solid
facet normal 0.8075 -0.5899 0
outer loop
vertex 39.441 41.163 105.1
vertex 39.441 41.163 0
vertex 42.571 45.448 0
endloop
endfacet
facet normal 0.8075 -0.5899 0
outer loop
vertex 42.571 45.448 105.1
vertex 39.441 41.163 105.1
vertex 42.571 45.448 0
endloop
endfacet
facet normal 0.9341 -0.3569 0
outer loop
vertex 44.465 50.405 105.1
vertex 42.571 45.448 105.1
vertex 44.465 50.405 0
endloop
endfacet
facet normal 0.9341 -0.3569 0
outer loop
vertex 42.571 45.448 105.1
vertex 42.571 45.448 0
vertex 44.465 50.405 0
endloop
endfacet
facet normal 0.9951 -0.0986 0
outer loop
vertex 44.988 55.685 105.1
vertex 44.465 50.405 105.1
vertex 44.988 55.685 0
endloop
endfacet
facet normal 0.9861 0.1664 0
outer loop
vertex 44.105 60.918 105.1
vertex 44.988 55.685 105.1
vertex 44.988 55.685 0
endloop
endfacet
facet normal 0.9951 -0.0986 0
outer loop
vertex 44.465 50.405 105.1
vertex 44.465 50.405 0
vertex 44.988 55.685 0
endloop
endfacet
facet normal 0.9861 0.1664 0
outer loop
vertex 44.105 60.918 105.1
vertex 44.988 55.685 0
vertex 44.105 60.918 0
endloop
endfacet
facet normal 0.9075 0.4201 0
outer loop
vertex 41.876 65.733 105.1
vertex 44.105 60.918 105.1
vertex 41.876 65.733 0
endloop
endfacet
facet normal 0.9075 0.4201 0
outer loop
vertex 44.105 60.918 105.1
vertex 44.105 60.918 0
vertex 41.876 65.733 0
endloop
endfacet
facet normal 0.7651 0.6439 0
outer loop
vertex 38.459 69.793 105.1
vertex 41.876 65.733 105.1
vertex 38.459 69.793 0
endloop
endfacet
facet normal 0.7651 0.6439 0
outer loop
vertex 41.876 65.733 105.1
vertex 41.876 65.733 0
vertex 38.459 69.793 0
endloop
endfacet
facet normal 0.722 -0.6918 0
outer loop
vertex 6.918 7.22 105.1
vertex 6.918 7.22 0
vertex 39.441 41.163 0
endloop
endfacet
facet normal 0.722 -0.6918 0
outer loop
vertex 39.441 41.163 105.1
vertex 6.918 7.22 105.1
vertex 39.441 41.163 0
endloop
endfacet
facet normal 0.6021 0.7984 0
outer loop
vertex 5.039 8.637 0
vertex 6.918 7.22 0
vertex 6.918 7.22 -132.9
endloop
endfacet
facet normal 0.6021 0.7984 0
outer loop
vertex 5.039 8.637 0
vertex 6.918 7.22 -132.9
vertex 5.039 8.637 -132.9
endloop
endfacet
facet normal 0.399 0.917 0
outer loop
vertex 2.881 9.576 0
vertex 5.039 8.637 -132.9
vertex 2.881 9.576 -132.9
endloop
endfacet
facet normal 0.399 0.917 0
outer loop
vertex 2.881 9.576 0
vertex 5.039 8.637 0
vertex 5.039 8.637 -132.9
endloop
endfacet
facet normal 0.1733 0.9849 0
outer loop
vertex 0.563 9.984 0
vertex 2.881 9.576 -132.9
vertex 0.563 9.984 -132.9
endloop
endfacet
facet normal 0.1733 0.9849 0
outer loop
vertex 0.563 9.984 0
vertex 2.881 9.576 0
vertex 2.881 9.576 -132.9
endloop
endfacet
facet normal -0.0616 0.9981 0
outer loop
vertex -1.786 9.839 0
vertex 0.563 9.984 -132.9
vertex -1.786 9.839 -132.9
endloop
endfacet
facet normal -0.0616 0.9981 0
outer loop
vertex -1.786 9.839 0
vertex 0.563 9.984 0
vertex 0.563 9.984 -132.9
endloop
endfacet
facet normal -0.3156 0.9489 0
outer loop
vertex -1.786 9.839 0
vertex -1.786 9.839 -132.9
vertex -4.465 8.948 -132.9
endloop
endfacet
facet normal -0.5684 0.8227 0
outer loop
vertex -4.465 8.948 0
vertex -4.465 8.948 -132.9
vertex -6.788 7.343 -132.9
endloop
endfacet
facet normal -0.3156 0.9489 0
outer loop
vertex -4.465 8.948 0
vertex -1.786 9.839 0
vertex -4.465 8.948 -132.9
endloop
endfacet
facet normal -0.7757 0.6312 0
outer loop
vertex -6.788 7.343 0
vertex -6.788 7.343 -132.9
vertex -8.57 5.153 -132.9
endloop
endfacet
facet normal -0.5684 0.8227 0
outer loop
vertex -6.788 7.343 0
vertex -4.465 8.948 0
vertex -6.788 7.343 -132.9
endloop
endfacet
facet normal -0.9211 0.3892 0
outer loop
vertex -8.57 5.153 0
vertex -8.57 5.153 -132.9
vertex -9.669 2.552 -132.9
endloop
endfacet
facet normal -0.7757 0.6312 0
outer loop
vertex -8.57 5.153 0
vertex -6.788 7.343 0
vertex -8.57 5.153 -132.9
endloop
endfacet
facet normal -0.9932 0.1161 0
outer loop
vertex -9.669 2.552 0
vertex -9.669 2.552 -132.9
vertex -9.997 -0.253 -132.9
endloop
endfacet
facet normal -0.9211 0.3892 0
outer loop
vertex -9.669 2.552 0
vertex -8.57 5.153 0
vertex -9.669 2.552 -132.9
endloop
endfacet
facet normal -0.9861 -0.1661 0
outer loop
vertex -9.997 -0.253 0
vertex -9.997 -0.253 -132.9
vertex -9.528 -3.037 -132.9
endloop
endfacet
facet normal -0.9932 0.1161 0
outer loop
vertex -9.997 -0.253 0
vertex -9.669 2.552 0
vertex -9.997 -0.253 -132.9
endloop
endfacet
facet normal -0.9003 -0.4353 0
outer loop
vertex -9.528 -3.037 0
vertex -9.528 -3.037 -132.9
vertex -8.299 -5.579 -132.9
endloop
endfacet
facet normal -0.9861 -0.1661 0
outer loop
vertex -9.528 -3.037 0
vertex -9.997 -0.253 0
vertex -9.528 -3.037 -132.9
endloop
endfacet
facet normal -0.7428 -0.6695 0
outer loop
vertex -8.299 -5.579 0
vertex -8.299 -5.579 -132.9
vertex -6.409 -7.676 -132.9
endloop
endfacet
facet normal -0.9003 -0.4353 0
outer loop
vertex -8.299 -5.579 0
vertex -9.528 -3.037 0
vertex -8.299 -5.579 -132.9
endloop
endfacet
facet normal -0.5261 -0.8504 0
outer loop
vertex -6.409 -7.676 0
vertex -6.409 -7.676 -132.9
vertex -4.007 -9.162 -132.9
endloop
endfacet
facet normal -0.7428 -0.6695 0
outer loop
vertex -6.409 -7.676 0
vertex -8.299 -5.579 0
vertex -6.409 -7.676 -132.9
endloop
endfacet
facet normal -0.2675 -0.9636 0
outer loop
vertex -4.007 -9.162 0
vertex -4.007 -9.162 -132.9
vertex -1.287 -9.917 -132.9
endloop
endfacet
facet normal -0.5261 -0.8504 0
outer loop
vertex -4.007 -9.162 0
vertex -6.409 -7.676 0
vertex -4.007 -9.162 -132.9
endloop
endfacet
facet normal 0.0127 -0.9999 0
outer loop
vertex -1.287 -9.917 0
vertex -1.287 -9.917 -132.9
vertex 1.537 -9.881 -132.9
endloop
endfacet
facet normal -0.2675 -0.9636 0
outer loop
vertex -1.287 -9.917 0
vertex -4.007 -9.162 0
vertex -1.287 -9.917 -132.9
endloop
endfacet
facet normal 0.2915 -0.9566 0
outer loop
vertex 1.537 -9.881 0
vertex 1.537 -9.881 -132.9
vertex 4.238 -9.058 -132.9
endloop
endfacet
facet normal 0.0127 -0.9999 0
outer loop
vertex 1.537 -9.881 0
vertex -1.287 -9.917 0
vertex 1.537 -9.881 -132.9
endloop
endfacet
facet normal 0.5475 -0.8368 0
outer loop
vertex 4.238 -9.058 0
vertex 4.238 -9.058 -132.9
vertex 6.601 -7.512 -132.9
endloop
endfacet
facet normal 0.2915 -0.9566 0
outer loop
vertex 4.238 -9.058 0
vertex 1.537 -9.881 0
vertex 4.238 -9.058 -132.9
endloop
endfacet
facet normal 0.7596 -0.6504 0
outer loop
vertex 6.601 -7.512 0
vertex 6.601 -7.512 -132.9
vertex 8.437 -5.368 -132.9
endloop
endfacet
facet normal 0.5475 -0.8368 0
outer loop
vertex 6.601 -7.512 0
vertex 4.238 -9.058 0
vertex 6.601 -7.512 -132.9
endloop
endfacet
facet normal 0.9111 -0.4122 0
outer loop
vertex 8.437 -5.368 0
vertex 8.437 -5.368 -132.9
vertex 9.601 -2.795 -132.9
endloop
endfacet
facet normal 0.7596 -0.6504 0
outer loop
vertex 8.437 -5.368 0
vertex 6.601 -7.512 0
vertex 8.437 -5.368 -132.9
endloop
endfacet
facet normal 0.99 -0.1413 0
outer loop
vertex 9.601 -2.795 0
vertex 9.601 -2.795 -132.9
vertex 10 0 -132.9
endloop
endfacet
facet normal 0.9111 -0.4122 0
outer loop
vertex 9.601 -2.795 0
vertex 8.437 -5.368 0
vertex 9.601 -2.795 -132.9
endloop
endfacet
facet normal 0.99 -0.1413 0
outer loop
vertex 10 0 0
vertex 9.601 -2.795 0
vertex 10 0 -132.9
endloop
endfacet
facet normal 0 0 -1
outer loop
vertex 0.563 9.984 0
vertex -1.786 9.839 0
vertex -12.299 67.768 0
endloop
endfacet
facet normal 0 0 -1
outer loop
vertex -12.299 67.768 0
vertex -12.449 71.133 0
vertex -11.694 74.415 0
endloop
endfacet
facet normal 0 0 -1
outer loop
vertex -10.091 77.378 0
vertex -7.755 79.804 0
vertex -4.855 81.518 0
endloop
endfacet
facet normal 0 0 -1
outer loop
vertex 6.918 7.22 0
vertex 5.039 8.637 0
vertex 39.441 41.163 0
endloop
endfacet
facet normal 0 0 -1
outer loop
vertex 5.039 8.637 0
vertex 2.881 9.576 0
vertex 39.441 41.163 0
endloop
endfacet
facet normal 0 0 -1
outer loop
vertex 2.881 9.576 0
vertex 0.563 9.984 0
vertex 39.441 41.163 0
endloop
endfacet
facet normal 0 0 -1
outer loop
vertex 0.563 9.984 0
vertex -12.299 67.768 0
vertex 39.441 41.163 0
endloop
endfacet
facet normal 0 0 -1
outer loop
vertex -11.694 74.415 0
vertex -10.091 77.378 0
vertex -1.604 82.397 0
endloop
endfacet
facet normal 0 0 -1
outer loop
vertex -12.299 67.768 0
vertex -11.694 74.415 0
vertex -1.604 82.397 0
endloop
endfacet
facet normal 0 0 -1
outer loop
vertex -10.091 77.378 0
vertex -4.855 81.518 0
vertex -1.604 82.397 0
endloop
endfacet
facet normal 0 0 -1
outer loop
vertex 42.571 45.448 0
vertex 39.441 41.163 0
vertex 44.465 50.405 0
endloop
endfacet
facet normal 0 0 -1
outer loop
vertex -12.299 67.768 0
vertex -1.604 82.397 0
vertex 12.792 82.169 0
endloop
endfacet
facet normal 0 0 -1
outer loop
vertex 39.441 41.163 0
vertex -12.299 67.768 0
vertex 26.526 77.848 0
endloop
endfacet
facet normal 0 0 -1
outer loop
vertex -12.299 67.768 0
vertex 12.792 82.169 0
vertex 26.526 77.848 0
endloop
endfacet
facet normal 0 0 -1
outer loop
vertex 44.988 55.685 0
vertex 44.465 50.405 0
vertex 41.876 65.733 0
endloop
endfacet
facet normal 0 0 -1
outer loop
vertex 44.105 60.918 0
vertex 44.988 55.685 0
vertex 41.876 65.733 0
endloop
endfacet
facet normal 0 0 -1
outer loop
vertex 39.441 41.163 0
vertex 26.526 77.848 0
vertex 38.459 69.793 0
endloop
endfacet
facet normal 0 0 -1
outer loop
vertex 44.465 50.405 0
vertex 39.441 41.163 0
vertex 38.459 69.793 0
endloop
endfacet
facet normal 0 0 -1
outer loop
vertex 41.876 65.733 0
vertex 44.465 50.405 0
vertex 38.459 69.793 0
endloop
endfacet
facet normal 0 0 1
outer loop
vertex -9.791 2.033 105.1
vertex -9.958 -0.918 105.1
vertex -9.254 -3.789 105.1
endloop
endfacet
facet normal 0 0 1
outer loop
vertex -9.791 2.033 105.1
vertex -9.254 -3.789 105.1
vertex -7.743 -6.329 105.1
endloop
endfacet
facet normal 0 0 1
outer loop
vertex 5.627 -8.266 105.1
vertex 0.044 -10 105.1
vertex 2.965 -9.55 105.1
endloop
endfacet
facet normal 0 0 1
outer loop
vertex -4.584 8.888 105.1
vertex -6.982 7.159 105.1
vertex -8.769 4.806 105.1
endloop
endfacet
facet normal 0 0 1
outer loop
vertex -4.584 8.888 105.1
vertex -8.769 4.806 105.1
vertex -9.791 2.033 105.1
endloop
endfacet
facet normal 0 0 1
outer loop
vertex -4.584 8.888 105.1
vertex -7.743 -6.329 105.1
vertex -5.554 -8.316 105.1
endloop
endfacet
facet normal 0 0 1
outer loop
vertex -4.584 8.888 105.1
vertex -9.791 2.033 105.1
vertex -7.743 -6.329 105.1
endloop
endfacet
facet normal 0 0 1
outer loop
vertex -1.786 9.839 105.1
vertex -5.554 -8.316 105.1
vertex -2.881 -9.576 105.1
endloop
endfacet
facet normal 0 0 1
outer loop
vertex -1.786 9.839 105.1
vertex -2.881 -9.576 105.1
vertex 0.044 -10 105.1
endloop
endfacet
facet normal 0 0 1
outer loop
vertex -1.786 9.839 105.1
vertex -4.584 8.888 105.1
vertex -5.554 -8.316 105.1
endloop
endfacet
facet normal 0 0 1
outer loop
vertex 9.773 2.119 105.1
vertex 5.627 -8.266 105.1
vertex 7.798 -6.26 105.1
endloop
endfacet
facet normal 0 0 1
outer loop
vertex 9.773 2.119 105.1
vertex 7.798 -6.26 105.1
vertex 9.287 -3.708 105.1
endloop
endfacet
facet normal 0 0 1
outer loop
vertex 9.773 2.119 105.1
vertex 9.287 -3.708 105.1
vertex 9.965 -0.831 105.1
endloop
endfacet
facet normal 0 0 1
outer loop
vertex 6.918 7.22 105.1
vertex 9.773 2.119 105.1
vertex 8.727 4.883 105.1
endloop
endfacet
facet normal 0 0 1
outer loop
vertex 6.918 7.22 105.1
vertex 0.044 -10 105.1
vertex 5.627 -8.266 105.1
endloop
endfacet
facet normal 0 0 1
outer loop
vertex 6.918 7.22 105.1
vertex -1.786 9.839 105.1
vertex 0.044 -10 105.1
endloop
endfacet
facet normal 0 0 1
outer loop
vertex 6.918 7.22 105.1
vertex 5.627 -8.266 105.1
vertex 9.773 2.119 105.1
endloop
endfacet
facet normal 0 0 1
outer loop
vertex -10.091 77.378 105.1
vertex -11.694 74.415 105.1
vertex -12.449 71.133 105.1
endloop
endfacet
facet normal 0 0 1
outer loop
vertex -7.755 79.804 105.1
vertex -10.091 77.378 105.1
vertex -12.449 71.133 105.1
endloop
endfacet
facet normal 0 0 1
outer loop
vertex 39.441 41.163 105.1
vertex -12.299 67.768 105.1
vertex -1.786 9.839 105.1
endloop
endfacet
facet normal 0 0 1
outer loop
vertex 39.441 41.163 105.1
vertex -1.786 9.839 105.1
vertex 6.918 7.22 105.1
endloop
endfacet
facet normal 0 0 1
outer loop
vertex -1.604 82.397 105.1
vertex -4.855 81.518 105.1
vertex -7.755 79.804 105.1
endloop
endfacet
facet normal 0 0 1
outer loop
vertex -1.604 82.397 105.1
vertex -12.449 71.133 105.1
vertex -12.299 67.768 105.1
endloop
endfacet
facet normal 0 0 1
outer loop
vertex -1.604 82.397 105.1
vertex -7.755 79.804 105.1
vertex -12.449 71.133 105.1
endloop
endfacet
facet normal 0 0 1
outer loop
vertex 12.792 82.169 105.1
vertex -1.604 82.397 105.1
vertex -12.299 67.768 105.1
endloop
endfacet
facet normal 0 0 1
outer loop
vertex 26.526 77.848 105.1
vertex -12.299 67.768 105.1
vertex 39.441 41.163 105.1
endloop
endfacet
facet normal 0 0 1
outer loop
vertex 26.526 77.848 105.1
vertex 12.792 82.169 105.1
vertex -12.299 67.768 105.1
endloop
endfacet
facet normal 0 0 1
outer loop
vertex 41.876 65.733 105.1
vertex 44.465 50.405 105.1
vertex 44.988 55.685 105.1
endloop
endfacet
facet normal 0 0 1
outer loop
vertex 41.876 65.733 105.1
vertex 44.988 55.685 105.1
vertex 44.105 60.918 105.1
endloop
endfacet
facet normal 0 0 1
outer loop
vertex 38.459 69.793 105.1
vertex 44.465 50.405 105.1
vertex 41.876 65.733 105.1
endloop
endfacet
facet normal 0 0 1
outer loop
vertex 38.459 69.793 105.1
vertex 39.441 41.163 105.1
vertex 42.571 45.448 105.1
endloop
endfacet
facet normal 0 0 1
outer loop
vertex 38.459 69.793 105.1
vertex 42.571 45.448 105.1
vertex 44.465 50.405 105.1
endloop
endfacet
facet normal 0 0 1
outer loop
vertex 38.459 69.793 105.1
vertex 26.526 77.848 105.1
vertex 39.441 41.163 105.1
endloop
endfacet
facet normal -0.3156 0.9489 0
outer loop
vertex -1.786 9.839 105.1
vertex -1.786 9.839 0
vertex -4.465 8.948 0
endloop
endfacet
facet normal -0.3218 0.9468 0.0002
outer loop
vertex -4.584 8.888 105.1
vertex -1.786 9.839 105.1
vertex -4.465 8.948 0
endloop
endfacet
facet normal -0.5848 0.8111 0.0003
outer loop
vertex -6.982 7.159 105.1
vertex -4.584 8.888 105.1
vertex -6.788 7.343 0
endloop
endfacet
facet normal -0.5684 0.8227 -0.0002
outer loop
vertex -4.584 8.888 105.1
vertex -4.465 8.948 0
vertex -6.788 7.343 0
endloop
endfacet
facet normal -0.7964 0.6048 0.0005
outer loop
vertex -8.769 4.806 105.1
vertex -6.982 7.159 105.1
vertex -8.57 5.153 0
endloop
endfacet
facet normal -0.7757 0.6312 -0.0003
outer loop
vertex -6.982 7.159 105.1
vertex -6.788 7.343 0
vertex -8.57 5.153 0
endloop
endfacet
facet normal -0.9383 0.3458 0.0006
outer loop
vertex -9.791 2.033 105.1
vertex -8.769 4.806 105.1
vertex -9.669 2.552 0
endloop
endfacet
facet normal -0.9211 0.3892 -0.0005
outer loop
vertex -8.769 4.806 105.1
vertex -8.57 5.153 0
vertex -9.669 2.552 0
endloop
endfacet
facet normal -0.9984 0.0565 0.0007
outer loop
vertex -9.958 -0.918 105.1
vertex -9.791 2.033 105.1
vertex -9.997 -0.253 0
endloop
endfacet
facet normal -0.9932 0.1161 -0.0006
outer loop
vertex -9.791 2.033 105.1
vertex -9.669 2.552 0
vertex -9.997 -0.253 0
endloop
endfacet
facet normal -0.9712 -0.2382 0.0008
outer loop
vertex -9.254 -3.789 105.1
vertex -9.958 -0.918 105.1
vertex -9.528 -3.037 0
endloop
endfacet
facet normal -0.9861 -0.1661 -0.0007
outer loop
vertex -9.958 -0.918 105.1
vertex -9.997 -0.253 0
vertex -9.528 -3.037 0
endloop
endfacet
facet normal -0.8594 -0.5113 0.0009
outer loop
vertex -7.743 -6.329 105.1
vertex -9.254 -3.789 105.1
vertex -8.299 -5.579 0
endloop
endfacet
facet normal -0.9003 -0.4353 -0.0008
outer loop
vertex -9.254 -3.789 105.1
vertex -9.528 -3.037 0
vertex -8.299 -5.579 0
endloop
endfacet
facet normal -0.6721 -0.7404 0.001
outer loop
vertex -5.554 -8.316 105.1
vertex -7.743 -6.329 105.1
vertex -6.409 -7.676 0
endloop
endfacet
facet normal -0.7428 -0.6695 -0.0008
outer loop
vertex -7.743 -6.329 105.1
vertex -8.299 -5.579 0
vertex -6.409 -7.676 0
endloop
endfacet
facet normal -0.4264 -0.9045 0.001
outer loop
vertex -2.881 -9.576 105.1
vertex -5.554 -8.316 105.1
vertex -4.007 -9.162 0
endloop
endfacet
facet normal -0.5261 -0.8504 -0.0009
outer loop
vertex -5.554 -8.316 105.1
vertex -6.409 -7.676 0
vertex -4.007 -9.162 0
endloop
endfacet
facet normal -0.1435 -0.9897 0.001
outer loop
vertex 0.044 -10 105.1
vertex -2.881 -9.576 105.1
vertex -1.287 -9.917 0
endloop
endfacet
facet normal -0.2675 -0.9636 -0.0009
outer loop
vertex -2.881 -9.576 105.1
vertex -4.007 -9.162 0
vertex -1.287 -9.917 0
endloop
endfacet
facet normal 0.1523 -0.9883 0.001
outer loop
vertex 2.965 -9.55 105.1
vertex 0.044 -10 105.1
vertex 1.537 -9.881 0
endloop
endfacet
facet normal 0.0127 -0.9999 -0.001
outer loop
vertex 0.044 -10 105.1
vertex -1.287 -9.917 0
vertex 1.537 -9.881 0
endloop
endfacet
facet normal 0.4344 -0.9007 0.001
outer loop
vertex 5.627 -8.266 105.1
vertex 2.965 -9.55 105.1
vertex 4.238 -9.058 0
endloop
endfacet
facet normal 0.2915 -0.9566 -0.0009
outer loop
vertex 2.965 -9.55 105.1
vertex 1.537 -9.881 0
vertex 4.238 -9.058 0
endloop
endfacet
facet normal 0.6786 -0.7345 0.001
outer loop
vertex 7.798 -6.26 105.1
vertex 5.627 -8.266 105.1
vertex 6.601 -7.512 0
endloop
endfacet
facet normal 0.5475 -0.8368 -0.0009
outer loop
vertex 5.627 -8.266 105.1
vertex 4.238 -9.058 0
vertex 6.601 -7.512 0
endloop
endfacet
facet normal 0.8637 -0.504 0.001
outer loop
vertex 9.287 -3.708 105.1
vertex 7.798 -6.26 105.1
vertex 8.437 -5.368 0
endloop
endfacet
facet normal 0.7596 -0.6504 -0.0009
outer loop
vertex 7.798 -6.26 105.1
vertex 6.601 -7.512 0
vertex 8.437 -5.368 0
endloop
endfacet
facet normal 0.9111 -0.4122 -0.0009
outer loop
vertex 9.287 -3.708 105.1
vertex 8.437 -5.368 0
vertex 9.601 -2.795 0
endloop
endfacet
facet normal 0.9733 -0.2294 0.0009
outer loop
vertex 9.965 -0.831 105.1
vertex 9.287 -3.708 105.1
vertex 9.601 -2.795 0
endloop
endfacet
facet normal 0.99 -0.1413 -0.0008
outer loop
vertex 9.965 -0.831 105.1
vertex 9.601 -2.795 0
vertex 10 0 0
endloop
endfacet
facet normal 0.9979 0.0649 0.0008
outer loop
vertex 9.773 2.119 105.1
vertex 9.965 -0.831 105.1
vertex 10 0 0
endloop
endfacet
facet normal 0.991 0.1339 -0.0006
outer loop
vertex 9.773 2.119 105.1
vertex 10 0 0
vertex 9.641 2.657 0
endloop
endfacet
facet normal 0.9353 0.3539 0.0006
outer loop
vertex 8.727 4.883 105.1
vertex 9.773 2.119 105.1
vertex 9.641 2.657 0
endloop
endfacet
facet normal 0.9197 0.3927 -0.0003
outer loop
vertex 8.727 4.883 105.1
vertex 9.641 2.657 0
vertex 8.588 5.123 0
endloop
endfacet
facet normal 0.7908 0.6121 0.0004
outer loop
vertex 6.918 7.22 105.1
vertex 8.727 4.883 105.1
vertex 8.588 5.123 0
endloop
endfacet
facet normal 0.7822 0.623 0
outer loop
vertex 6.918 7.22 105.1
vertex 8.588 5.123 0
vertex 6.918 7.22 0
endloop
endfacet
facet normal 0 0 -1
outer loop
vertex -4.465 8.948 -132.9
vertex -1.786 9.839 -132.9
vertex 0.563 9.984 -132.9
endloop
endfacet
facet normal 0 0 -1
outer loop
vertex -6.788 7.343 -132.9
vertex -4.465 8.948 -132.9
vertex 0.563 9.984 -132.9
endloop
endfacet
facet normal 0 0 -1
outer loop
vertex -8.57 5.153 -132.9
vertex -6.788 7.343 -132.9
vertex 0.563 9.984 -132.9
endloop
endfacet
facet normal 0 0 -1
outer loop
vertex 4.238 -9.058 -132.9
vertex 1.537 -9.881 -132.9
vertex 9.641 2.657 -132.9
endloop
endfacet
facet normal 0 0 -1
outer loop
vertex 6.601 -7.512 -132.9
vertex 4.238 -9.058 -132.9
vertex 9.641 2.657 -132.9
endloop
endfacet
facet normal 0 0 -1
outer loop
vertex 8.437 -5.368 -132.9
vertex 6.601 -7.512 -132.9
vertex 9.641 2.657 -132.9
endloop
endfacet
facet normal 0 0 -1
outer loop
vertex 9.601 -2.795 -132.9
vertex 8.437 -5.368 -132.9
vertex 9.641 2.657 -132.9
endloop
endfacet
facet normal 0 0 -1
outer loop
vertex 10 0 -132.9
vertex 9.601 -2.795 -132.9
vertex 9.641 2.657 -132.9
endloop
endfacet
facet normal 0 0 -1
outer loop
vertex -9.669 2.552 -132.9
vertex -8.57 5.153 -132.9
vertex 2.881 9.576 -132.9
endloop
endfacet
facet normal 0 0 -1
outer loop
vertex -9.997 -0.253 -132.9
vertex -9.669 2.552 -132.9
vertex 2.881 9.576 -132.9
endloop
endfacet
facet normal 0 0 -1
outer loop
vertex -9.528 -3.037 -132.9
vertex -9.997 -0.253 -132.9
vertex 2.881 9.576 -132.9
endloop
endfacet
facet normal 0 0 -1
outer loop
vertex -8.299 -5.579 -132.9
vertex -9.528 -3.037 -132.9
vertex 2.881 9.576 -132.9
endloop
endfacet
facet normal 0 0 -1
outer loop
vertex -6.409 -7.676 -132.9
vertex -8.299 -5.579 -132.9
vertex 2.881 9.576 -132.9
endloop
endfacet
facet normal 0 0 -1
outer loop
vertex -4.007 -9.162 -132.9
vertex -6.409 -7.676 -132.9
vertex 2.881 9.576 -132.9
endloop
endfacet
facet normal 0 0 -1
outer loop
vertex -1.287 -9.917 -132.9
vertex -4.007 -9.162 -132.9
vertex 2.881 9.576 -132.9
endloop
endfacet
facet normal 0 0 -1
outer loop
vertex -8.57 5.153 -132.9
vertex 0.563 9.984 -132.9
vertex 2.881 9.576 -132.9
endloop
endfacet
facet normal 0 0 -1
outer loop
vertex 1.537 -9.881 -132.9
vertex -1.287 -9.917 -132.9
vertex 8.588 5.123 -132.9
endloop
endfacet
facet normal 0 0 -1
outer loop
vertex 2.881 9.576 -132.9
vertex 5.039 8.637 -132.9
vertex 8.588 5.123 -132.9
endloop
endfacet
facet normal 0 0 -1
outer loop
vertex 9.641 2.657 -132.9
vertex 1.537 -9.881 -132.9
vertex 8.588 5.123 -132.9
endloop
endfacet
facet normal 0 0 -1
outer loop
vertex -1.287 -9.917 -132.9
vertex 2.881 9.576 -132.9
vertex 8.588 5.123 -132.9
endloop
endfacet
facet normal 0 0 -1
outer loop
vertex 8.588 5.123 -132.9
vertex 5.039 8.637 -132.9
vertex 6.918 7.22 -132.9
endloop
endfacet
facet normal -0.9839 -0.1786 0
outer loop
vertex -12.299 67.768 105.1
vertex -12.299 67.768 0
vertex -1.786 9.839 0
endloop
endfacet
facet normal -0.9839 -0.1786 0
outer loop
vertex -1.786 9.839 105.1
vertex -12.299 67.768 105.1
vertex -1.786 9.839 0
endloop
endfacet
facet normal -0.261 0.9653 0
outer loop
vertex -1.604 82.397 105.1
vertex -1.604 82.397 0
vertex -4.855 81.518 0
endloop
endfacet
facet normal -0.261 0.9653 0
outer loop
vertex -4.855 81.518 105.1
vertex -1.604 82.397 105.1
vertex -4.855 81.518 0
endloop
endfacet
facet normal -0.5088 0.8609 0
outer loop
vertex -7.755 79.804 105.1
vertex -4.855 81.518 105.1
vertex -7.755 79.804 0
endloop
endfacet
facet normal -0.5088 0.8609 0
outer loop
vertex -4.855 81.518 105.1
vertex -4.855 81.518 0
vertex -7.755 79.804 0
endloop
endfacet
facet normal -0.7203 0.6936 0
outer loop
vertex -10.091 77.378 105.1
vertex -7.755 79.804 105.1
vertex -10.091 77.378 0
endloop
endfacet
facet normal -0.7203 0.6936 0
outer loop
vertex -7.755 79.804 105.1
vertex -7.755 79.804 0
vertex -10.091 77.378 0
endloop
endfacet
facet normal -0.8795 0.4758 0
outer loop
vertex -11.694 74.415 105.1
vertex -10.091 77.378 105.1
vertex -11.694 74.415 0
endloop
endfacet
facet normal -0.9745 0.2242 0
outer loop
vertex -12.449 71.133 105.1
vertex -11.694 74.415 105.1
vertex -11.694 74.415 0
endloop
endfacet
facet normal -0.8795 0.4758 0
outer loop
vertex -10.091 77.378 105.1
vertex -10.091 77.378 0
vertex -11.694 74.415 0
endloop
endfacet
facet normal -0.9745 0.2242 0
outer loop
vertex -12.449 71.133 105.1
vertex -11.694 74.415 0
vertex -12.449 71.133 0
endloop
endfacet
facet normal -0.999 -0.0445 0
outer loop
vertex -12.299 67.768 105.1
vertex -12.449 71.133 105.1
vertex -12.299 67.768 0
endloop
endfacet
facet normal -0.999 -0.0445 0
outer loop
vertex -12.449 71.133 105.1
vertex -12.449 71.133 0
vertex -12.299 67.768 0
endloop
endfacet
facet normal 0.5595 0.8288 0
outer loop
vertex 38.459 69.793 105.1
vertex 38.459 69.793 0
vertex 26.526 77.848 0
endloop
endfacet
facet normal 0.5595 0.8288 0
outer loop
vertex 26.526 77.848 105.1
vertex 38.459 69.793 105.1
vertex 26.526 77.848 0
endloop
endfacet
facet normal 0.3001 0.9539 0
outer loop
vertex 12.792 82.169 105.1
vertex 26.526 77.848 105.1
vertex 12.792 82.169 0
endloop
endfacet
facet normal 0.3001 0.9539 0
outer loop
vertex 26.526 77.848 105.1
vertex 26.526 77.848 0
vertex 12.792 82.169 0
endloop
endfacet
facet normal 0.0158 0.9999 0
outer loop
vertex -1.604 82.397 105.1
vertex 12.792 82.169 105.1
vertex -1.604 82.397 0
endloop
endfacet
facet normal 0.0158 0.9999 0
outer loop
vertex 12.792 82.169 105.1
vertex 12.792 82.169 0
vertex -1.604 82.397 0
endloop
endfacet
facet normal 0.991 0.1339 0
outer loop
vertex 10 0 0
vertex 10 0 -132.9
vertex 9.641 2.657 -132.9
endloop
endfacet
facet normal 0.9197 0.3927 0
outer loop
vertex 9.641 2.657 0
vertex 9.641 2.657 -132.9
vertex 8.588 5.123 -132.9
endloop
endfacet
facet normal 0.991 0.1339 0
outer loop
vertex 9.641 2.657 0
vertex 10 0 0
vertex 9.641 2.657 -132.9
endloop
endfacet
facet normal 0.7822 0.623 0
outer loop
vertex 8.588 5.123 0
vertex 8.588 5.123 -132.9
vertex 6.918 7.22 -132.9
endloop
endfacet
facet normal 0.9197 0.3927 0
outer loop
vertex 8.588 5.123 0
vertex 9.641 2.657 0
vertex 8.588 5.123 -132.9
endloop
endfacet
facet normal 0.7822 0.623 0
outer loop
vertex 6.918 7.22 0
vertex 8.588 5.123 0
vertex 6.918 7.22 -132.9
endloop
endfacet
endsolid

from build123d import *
from build123d import SkipClean  # not in build123d's __all__

# Parameters (mm, degrees)
F1_DEPTH = 105.1
F3_DEPTH = 132.9


with BuildPart() as f1:
    # F0 (on Top) → F1 (new body)
    with BuildSketch(Plane.XY):
        with BuildLine():
            Line((-12.2990868875, 67.7678571429), (-1.7857142857, 9.83926951))
            ThreePointArc((-1.7857142857, 9.83926951), (-2.8810809532, -9.5759789338), (6.9184089901, 7.2204997781))
            Line((6.9184089901, 7.2204997781), (39.4409995563, 41.1631820199))
            ThreePointArc((39.4409995563, 41.1631820199), (44.9882549975, 55.6853190171), (38.4593810195, 69.7934128102))
            ThreePointArc((38.4593810195, 69.7934128102), (19.8153219741, 80.5054589403), (-1.6036428236, 82.3967064051))
            ThreePointArc((-1.6036428236, 82.3967064051), (-10.0907027029, 77.3775144162), (-12.2990868875, 67.7678571429))
        make_face()
    extrude(amount=F1_DEPTH)

    # F2 (on face) → F3 (join)
    with BuildSketch(Plane.XY):
        with BuildLine():
            ThreePointArc((-1.7857142857, 9.83926951), (-6.4086994446, -7.6764947358), (10, 0))
            ThreePointArc((10, 0), (9.197393378, 3.9252968104), (6.9184089901, 7.2204997781))
            ThreePointArc((6.9184089901, 7.2204997781), (2.8810809532, 9.5759789338), (-1.7857142857, 9.83926951))
        make_face()
    with SkipClean():  # cleaning this boolean's faces spoils the solid; the shape is the same uncleaned
        extrude(amount=-F3_DEPTH)


solid = f1.part
